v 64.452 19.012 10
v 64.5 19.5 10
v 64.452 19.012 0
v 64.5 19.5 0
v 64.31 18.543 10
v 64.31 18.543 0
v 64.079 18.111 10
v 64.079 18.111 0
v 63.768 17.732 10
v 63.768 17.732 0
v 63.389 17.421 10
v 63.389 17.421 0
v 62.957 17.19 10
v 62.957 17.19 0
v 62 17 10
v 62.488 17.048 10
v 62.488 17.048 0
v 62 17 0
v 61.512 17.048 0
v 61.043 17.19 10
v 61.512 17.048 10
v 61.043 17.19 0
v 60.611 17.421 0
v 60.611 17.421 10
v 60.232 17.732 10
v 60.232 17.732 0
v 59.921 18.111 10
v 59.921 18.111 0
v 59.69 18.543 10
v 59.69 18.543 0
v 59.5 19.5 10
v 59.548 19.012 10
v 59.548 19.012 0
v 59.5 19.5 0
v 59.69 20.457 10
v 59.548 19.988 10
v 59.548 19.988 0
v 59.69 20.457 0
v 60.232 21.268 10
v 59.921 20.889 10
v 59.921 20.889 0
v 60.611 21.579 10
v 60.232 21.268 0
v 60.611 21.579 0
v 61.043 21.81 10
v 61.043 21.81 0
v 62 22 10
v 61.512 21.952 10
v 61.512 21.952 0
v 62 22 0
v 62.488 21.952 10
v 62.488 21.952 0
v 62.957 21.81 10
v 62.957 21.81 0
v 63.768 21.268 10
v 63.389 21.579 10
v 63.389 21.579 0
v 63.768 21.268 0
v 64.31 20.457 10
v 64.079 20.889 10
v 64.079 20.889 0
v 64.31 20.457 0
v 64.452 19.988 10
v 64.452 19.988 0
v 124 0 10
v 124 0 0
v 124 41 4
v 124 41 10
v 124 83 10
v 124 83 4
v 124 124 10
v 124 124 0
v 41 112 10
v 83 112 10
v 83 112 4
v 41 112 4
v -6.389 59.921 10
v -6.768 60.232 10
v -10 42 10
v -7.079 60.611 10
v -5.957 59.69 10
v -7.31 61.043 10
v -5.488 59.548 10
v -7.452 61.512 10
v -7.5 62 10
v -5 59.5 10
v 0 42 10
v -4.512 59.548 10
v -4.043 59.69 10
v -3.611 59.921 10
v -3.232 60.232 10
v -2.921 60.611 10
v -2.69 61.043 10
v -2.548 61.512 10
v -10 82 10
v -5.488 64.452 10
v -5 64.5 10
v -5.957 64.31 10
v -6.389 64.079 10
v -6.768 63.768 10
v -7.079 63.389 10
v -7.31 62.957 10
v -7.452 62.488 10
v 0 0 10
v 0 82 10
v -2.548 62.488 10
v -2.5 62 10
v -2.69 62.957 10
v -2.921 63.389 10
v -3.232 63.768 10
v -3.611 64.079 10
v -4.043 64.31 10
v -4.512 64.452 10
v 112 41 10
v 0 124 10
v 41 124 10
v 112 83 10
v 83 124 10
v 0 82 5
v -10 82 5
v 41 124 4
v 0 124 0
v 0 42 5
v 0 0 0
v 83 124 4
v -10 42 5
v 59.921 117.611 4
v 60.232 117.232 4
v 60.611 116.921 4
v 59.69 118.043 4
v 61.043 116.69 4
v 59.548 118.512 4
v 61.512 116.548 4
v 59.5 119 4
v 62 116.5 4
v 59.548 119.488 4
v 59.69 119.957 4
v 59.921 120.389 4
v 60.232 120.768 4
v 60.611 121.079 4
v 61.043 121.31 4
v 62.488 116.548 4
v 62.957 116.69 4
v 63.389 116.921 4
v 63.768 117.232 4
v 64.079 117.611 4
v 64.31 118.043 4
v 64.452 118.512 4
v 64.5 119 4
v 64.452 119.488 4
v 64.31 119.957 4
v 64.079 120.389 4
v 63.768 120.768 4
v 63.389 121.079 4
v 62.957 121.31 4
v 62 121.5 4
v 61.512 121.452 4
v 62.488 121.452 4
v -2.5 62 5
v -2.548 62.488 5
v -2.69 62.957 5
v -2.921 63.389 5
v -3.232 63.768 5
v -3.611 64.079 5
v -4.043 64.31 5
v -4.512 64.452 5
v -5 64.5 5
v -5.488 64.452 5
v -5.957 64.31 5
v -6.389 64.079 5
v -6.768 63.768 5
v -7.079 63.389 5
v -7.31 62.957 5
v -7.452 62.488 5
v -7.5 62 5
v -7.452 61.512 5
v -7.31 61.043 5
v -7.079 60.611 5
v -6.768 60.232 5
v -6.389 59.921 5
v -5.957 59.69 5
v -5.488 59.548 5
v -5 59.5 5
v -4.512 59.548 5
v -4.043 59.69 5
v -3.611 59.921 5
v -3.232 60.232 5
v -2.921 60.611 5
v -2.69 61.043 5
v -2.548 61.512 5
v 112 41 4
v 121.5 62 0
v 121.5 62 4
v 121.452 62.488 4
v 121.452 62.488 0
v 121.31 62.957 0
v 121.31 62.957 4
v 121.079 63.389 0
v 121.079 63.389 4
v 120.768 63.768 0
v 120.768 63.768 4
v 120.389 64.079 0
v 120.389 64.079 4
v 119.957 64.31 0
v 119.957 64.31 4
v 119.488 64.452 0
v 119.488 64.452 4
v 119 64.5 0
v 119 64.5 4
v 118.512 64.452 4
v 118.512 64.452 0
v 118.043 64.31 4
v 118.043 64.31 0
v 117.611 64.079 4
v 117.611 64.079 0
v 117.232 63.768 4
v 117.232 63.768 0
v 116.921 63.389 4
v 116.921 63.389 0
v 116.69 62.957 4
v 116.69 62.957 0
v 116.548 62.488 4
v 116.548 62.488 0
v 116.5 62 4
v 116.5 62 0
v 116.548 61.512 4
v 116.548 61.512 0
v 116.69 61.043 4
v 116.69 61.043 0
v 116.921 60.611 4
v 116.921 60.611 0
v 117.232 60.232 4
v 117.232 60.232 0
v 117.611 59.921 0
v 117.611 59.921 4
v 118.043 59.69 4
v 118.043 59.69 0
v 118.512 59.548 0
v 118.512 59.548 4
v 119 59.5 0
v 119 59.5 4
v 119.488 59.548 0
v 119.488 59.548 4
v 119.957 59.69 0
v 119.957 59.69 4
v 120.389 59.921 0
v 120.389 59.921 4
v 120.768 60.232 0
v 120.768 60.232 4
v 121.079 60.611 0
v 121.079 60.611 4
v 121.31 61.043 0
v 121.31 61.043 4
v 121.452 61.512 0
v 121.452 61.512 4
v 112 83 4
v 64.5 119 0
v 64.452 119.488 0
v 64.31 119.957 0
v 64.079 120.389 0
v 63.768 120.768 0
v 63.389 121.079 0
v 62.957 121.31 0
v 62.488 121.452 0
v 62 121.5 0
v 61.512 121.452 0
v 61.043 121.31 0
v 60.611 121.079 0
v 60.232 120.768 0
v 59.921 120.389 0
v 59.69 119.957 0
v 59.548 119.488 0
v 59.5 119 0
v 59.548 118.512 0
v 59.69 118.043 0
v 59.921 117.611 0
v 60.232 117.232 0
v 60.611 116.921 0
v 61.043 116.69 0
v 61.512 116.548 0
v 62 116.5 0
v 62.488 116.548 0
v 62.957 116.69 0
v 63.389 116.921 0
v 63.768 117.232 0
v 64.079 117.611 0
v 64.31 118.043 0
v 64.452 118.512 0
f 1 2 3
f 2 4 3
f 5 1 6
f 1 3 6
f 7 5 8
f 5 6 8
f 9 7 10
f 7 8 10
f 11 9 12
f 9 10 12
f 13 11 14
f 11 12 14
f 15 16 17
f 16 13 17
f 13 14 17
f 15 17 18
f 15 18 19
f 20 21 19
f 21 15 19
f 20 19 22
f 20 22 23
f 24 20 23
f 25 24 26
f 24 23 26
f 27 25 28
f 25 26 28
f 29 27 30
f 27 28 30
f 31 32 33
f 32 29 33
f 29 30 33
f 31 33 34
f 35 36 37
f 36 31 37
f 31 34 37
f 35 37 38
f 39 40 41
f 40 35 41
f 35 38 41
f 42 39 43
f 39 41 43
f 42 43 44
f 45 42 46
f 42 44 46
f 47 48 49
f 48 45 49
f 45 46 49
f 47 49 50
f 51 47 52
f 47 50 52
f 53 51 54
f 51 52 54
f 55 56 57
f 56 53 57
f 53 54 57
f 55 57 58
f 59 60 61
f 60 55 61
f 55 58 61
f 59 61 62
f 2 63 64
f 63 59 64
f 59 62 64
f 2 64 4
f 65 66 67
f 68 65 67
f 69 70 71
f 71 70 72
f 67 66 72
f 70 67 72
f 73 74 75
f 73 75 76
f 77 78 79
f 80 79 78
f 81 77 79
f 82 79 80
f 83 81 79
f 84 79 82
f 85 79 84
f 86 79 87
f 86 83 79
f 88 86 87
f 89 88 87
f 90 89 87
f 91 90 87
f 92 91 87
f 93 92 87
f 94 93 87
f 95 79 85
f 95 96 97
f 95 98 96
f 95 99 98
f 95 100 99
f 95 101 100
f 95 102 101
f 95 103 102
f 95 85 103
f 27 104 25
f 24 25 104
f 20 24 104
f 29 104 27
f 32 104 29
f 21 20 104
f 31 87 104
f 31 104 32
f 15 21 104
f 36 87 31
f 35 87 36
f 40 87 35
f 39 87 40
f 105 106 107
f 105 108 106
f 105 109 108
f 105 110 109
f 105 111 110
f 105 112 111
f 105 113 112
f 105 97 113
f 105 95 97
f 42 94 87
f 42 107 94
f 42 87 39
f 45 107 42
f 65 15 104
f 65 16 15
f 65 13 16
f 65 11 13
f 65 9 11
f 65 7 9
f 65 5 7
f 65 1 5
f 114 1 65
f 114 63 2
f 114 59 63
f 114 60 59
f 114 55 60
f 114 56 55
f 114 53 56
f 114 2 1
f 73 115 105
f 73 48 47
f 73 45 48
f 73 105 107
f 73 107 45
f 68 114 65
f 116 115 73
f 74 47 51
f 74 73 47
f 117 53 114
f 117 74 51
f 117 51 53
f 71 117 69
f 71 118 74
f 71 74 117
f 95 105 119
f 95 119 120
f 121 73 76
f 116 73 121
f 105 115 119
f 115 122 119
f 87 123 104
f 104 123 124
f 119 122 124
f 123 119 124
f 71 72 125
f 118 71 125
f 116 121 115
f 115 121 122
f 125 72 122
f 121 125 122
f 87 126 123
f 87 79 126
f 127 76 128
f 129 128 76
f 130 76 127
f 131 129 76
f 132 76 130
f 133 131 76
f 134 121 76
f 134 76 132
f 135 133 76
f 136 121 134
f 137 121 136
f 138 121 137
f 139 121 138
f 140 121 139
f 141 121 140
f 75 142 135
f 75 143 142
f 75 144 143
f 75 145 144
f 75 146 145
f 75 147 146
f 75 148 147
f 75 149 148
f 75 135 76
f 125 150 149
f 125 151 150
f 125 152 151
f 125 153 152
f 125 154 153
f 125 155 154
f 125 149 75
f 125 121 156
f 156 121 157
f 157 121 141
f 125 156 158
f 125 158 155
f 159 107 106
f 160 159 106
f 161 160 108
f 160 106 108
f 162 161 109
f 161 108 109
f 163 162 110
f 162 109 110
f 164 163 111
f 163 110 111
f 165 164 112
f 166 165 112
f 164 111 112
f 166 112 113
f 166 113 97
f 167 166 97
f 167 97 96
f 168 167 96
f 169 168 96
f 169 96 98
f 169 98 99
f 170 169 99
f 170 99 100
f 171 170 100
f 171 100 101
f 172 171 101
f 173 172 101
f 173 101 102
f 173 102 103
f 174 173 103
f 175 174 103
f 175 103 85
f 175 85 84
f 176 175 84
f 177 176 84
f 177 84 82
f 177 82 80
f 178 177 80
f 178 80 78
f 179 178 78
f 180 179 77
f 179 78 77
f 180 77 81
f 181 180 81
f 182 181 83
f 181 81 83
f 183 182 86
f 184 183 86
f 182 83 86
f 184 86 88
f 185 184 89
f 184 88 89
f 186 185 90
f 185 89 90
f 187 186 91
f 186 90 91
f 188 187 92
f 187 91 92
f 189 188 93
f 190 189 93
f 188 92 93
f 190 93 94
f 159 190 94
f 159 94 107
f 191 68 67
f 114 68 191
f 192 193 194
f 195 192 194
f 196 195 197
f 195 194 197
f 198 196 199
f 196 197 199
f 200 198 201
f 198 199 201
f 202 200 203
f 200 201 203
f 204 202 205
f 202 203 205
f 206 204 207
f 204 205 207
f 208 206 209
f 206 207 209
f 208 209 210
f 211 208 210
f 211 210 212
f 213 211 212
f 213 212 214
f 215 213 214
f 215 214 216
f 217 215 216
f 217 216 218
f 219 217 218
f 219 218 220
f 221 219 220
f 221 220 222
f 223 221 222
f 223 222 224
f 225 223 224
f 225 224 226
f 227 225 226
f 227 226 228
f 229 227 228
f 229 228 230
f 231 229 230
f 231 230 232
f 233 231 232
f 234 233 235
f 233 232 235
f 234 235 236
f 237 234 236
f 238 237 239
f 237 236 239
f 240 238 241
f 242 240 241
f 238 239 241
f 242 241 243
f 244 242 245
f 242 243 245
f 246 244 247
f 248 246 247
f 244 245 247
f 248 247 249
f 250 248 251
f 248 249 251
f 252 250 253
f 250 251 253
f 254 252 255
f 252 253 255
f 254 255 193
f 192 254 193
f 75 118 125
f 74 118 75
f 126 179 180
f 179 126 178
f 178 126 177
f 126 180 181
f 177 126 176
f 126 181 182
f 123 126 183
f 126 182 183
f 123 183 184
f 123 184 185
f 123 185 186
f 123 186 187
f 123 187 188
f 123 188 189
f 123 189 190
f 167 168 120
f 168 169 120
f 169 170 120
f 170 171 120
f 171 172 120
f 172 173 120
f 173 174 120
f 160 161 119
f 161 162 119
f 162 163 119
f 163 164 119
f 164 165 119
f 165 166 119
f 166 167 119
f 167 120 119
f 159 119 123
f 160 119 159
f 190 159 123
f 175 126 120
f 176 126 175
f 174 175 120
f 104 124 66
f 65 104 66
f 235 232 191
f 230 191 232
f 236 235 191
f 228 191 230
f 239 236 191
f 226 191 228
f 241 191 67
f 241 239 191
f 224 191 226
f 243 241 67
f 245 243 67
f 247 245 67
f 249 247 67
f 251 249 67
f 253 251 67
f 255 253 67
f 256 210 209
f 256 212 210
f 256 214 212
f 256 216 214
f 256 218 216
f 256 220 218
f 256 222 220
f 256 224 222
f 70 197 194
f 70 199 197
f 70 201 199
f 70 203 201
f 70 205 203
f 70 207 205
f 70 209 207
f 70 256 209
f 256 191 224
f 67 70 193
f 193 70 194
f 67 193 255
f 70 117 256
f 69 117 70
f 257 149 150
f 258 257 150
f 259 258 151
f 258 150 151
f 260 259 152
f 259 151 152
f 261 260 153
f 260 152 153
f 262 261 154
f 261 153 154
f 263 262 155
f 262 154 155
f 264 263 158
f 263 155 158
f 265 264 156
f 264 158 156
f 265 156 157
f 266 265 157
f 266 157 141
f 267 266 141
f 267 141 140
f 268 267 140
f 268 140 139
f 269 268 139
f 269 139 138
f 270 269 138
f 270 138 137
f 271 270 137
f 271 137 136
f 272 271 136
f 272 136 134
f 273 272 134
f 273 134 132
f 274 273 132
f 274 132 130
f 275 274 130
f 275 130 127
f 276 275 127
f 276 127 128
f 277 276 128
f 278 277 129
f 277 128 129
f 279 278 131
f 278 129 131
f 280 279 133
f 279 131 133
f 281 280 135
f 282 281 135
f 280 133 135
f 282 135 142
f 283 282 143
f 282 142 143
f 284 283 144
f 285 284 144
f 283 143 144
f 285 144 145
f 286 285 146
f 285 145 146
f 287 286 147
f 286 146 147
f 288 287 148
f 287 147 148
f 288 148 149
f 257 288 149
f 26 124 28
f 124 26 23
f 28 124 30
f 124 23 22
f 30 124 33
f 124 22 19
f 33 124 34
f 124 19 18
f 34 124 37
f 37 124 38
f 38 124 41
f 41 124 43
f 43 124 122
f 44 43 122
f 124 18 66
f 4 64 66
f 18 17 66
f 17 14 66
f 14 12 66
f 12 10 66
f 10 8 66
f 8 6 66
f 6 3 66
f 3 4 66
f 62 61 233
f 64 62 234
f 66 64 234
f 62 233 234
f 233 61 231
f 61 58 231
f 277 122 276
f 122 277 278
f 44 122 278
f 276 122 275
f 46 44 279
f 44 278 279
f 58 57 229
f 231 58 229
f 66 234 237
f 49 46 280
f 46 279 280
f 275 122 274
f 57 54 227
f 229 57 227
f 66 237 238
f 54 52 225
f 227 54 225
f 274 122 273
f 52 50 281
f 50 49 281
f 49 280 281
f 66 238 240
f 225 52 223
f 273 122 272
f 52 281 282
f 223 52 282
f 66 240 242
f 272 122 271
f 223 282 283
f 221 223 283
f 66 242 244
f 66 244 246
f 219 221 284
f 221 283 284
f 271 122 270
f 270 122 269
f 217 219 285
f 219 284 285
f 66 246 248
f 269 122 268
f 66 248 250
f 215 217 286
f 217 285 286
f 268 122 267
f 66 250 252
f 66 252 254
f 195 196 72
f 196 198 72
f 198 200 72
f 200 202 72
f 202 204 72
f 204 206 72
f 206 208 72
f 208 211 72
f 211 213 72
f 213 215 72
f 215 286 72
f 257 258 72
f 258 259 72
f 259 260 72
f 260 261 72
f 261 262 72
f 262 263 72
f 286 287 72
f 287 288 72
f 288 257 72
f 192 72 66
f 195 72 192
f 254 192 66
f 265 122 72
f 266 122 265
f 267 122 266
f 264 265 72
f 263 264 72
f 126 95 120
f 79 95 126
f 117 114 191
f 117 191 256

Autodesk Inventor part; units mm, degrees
ref_plane "YZ Plane" through (0, 0, 0) normal (1, 0, 0) x (0, 1, 0)
ref_plane "XZ Plane" through (0, 0, 0) normal (0, 1, 0) x (-1, 0, 0)
ref_plane "XY Plane" through (0, 0, 0) normal (0, 0, 1) x (1, 0, 0)
sketch "Sketch1" plane through (0, 0, 0) normal (0, 0, 1) x (1, 0, 0)
  line L0 (0, 0) -> (124, 0)
  line L1 (124, 0) -> (124, 124)
  line L2 (124, 124) -> (0, 124)
  line L3 (0, 124) -> (0, 0)
  circle A0 centre (62, 19.5) radius 2.5
  point P0 (62, 0)
  dimension "d0" = 124
  dimension "d1" = 124
  dimension "d2" = 5
  dimension "d3" = 19.5
extrude "Extrusion1" add sketch "Sketch1" along normal blind 10
sketch "Sketch2" plane through (0, 0, 10) normal (0, 0, 1) x (1, 0, 0)
  line L0 (0, 124) -> (0, 0) projected
  line L1 (0, 82) -> (-10, 82)
  line L2 (-10, 82) -> (-10, 42)
  line L3 (-10, 42) -> (0, 42)
  line L4 (0, 42) -> (0, 82)
  circle A0 centre (-5, 62) radius 2.5
  point P0 (-10, 62)
  point P1 (0, 62)
  point P2 (-5, 82)
  dimension "d8" = 10
  dimension "d9" = 40
  dimension "d10" = 5
extrude "Extrusion2" add sketch "Sketch2" against normal blind 5
sketch "Sketch3" plane through (0, 0, 10) normal (0, 0, 1) x (1, 0, 0)
  line L0 (124, 0) -> (124, 124) projected
  line L1 (124, 41) -> (112, 41)
  line L2 (112, 41) -> (112, 83)
  line L3 (112, 83) -> (124, 83)
  line L4 (124, 83) -> (124, 41)
  point P0 (0, 0)
  point P1 (112, 62)
  point P2 (124, 62)
  dimension "d13" = 12
  dimension "d14" = 42
extrude "Extrusion3" cut sketch "Sketch3" against normal blind 6
sketch "Sketch4" plane through (0, 0, 4) normal (0, 0, 1) x (1, 0, 0)
  line L0 (124, 41) -> (112, 41) construction
  line L1 (124, 83) -> (124, 41) construction
  line L2 (112, 83) -> (124, 83) construction
  line L3 (112, 41) -> (112, 83) construction
  circle A0 centre (119, 62) radius 2.5
  point P0 (0, 0)
  point P1 (124, 62)
  point P2 (118, 41)
  dimension "d17" = 5
  dimension "d28" = 5
extrude "Extrusion4" cut sketch "Sketch4" against normal through all
sketch "Sketch5" plane through (0, 0, 10) normal (0, 0, 1) x (1, 0, 0)
  line L0 (41, 124) -> (83, 124)
  line L1 (83, 124) -> (83, 112)
  line L2 (83, 112) -> (41, 112)
  line L3 (41, 112) -> (41, 124)
  line L4 (124, 124) -> (0, 124) projected
  point P0 (0, 0)
  point P1 (62, 112)
  point P2 (62, 124)
  dimension "d20" = 42
  dimension "d21" = 12
extrude "Extrusion5" cut sketch "Sketch5" against normal blind 6
sketch "Sketch6" plane through (0, 0, 4) normal (0, 0, 1) x (1, 0, 0)
  circle A0 centre (62, 119) radius 2.5
  line L0 (41, 124) -> (83, 124) construction
  line L1 (41, 112) -> (41, 124) construction
  line L2 (83, 112) -> (41, 112) construction
  line L3 (83, 124) -> (83, 112) construction
  point P0 (0, 0)
  point P1 (83, 118)
  point P2 (62, 124)
  dimension "d24" = 5
  dimension "d27" = 5
extrude "Extrusion6" cut sketch "Sketch6" against normal through all
properties part number "TA002" material "ABS Plastic"
